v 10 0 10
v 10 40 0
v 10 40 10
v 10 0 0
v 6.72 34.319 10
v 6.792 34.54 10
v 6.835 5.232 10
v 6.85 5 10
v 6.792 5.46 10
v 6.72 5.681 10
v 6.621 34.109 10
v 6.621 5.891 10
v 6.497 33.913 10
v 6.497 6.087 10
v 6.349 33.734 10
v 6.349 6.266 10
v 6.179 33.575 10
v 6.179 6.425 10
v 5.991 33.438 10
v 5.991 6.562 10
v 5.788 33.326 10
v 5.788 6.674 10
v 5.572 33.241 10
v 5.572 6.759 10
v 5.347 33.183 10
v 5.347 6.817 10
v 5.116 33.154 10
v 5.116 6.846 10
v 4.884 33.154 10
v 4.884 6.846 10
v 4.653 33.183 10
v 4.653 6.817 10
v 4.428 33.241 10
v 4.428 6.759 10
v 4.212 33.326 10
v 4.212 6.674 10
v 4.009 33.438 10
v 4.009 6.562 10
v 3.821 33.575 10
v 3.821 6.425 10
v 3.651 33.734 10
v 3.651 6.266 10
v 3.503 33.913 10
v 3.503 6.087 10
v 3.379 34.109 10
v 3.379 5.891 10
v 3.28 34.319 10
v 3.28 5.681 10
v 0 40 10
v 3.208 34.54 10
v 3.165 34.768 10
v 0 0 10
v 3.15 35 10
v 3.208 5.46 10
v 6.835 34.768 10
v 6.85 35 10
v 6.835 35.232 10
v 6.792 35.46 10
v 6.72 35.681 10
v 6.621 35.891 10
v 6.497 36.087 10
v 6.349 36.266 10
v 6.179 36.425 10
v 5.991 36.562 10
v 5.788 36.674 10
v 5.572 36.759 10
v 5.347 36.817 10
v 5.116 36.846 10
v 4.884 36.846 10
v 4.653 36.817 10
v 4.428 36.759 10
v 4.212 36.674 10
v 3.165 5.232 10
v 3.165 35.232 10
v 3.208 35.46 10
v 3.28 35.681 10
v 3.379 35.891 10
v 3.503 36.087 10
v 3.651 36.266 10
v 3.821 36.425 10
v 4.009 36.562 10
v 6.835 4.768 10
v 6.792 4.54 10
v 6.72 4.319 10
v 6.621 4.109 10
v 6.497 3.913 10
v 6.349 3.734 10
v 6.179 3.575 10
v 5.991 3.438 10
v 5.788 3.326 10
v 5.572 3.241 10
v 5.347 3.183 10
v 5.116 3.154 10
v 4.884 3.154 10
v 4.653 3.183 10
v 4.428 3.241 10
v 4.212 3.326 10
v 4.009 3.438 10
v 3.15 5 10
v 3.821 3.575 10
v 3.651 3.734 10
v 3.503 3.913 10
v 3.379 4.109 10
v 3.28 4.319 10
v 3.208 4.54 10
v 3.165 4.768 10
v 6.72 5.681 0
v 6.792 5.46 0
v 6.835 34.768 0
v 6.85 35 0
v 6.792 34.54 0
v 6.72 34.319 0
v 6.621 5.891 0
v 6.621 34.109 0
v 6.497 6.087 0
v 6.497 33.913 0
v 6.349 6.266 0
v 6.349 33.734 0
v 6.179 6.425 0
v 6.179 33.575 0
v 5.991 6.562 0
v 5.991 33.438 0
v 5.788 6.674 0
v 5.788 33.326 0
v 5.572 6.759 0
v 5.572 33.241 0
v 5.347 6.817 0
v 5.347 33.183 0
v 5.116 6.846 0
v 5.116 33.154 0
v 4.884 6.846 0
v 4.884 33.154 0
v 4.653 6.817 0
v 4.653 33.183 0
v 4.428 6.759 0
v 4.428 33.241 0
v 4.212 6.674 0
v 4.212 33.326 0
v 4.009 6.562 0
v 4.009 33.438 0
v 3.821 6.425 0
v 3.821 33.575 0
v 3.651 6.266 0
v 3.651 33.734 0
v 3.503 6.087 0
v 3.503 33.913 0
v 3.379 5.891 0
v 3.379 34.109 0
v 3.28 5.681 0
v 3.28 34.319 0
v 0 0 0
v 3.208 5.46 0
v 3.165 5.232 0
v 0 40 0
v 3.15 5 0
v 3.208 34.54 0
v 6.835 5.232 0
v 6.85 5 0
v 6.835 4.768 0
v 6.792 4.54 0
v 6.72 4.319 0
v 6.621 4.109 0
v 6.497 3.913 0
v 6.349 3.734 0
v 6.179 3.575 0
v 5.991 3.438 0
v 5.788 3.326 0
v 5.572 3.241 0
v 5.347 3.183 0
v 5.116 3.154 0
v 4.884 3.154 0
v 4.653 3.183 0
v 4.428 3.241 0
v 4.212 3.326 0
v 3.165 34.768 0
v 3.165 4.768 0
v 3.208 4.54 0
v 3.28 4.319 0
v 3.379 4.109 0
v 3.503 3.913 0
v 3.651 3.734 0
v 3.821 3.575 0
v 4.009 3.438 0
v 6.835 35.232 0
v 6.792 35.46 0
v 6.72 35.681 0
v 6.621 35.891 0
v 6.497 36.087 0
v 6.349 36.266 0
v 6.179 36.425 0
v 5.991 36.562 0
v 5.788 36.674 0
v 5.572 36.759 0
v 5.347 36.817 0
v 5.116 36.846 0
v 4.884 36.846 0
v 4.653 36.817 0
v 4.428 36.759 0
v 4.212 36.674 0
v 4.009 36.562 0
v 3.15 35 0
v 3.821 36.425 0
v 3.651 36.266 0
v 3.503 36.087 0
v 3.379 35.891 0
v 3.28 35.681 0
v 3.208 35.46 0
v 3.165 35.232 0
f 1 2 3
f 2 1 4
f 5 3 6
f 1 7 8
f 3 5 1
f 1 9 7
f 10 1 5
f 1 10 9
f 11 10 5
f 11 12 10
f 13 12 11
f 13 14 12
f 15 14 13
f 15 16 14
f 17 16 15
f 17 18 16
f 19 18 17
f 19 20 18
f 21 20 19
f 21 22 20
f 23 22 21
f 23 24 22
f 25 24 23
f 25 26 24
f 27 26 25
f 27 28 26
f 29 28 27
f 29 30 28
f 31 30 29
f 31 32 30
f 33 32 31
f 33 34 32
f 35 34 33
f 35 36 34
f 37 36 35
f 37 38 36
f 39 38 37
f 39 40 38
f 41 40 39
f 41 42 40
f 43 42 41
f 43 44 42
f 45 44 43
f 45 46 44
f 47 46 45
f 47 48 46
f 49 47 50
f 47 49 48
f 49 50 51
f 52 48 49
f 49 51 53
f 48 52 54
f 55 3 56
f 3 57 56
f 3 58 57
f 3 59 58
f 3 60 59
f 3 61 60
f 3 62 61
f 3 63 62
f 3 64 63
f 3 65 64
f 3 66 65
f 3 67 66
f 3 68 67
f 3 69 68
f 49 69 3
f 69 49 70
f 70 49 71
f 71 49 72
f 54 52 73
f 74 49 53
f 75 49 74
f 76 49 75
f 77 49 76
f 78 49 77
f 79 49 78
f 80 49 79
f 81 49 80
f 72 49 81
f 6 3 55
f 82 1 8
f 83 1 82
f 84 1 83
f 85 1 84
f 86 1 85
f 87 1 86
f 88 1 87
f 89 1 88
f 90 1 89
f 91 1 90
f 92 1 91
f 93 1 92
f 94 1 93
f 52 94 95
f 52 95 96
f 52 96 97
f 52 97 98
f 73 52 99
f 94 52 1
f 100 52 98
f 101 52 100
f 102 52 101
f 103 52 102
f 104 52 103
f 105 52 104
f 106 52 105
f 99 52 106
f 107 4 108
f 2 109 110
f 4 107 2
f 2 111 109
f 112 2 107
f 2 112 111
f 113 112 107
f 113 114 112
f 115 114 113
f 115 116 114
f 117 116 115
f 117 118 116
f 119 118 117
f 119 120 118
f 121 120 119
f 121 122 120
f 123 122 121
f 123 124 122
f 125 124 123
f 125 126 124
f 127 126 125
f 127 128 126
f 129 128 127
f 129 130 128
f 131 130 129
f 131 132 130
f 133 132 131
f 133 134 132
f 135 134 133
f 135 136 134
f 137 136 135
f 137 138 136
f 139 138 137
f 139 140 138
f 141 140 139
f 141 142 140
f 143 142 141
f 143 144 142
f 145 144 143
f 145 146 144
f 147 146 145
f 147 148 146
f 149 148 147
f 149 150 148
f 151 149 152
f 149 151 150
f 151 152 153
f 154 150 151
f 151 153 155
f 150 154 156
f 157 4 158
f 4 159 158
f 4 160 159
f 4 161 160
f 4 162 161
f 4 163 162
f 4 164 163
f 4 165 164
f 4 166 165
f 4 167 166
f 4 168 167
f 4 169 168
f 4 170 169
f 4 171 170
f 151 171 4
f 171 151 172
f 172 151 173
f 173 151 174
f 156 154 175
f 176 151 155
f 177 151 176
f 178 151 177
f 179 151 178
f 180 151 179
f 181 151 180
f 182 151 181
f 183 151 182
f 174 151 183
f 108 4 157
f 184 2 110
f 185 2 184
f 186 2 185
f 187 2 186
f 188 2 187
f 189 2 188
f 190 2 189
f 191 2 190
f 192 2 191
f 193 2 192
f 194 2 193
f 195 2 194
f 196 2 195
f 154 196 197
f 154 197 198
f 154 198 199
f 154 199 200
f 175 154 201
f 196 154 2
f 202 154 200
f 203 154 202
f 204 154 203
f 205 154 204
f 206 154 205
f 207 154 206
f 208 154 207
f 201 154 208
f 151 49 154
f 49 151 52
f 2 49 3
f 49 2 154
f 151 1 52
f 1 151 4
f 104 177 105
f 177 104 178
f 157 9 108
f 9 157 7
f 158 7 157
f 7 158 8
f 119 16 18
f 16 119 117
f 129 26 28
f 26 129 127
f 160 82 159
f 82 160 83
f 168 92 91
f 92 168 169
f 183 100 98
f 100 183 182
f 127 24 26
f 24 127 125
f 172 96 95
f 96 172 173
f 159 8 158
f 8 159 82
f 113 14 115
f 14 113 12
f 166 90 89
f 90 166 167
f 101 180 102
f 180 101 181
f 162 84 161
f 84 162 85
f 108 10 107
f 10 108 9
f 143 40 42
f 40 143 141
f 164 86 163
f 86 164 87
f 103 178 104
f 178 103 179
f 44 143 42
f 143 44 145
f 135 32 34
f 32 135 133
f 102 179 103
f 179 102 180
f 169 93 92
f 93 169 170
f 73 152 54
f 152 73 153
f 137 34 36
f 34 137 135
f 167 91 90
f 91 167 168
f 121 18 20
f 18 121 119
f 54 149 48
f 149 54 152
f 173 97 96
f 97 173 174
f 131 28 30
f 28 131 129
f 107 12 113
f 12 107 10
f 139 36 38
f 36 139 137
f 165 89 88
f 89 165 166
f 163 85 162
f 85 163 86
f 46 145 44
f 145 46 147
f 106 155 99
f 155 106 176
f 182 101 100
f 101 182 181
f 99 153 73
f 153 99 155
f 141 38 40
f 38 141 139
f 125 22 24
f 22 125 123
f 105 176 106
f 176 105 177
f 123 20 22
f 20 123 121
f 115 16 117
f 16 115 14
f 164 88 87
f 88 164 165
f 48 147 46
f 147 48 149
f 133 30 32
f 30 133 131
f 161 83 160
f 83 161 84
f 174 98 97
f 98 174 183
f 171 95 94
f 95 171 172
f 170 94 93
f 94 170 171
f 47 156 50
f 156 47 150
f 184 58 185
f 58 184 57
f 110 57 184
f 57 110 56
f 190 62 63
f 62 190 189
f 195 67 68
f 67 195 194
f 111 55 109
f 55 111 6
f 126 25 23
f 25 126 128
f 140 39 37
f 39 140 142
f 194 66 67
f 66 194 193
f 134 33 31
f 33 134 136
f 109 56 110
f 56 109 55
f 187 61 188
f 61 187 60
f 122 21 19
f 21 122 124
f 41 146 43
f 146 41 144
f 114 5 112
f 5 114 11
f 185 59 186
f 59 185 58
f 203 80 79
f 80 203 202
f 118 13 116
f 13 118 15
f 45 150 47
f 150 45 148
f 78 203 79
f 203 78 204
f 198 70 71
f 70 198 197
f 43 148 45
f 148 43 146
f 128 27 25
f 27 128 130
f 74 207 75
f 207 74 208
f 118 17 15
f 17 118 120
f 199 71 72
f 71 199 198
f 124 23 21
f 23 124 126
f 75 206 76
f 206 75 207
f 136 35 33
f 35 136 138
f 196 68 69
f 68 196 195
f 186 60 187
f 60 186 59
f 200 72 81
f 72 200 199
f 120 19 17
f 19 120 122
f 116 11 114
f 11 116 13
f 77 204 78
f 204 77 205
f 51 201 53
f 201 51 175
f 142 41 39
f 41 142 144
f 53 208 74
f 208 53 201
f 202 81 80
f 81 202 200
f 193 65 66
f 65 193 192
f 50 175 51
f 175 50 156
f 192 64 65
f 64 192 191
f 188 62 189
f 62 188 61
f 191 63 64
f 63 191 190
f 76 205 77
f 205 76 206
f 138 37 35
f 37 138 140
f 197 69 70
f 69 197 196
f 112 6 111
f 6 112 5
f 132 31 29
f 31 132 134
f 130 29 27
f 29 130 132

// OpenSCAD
// Resolution
$fn=50;

// Properties
m3_clear = 3.7/2;
screw_centers = 30;

// Beam
width = 10;
length = screw_centers + width;

difference(){
    cube([width,length,width]);
     // Screw holes
    translate([width/2, width/2, 0])
    cylinder(h=2*width, r1=m3_clear, r2=m3_clear);
    
    translate([width/2, length-width/2, 0])
    cylinder(h=2*width, r1=m3_clear, r2=m3_clear);
}
